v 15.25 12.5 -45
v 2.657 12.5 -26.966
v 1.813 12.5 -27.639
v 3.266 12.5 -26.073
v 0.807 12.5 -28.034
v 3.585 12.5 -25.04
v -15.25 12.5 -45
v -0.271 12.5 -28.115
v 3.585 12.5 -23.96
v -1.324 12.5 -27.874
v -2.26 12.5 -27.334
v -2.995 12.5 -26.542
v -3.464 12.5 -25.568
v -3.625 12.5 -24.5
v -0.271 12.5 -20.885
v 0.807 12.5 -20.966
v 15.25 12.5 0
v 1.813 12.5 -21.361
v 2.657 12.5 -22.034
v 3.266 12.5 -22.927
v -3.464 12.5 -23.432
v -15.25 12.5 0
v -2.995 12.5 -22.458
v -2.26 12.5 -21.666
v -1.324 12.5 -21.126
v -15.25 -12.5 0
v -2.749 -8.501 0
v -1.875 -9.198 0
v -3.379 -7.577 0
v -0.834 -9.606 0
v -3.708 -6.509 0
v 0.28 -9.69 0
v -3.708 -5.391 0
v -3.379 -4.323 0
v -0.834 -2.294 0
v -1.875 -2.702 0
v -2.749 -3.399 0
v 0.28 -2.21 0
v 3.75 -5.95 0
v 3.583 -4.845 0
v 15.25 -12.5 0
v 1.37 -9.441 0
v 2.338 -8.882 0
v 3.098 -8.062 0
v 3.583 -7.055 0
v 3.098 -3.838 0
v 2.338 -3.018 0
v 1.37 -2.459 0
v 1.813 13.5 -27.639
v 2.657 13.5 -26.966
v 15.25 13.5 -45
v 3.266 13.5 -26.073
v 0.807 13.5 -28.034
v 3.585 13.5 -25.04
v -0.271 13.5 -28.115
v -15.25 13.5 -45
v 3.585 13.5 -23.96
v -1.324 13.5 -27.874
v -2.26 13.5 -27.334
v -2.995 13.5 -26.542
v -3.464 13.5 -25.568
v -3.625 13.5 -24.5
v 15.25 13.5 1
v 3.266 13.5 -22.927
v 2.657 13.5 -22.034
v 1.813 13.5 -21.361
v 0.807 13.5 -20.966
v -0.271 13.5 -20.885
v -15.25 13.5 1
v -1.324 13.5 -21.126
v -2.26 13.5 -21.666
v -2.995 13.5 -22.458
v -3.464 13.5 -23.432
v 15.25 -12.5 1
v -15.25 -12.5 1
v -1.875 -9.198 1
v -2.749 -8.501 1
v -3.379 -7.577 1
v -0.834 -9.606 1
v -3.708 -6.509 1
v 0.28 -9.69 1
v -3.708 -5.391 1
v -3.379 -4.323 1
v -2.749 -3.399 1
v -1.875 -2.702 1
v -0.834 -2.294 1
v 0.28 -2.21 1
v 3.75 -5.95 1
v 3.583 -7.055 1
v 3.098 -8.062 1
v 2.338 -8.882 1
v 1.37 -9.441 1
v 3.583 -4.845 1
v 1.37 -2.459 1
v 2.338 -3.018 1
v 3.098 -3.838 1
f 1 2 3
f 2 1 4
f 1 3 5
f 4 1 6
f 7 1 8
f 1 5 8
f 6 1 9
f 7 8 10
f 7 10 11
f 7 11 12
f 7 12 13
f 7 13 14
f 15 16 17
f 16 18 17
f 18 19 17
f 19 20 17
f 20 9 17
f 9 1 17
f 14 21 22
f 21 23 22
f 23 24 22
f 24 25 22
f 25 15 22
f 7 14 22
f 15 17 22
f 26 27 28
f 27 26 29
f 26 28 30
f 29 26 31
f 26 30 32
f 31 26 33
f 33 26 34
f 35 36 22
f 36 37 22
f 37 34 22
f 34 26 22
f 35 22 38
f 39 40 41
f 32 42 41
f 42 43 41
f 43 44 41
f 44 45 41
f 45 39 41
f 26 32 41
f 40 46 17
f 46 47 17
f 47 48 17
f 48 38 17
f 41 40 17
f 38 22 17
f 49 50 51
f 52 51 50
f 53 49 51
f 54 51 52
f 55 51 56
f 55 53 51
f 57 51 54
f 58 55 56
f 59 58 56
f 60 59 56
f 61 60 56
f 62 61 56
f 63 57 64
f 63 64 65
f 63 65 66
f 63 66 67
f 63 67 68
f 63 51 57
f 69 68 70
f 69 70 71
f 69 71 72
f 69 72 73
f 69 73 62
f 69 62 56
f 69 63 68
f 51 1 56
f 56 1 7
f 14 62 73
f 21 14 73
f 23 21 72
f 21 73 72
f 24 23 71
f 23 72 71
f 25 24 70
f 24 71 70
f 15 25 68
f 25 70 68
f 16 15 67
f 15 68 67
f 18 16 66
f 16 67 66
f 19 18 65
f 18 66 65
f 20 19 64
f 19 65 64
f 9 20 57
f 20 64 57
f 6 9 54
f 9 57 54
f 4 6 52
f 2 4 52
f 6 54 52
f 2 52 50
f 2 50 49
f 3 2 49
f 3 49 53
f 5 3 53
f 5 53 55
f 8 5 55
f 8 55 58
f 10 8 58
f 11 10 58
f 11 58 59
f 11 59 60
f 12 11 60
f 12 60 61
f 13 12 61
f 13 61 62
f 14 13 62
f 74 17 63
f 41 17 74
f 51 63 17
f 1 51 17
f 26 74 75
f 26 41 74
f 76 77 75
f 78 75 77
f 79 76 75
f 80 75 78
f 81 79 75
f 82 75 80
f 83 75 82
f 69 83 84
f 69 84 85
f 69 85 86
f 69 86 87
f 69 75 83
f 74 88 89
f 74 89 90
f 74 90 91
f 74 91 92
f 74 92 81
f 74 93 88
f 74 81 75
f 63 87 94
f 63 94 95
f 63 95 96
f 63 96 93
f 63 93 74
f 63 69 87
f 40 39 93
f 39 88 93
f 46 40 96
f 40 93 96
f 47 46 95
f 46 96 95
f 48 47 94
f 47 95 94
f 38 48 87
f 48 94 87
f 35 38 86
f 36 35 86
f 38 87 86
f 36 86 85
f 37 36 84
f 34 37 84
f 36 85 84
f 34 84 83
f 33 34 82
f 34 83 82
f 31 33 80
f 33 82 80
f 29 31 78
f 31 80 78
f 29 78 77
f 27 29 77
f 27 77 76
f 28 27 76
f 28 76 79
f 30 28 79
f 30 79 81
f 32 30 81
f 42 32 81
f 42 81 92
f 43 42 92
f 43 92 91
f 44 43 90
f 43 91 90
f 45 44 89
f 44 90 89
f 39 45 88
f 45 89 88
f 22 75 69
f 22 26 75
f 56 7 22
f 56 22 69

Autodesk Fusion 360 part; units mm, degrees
sketch "Sketch1" plane through (0, 0, 0) normal (0, 0, 1) x (1, 0, 0)
  line L0 (15.25, -12.5) -> (-15.25, -12.5)
  line L1 (-15.25, -12.5) -> (-15.25, 12.5)
  line L2 (-15.25, 12.5) -> (15.25, 12.5)
  line L3 (15.25, 12.5) -> (15.25, -12.5)
  line L4 (15.25, -12.5) -> (-15.25, 12.5) construction
  line L5 (-15.25, -12.5) -> (15.25, 12.5) construction
  dimension "d1" = 30.5
  dimension "d2" = 25
extrude "Extrude1" add sketch "Sketch1" along normal blind 1
sketch "Sketch2" plane through (0, 12.5, 0) normal (0, 1, 0) x (-1, 0, 0)
  line L0 (-15.25, 0) -> (15.25, 0)
  line L1 (15.25, 0) -> (15.25, 1)
  line L2 (15.25, 1) -> (-15.25, 1)
  line L3 (-15.25, 1) -> (-15.25, 0)
  line L4 (15.25, 1) -> (-15.25, 1)
  line L5 (-15.25, 1) -> (-15.25, -45)
  line L6 (-15.25, -45) -> (15.25, -45)
  line L7 (15.25, -45) -> (15.25, 1)
  dimension "d5" = 46
  dimension "d6" = 30.5
extrude "Extrude2" add sketch "Sketch2" along normal blind 1
sketch "Sketch3" plane through (0, 0, 1) normal (0, 0, 1) x (1, 0, 0)
  line L0 (-15.25, 13.5) -> (-15.25, -12.5)
  line L1 (-15.25, -12.5) -> (15.25, -12.5)
  line L2 (15.25, -12.5) -> (15.25, 13.5)
  line L3 (15.25, 13.5) -> (-15.25, 13.5)
  line L4 (0, -12.5) -> (0, -5.95)
  circle A0 centre (0, -5.95) radius 3.75
  dimension "d9" = 6.55
  dimension "d10" = 7.5
extrude "Extrude3" cut sketch "Sketch3" against normal blind 46 contours A0
sketch "Sketch4" plane through (0, 13.5, 0) normal (0, 1, 0) x (-1, 0, 0)
  line L0 (15.25, -45) -> (15.25, 1)
  line L1 (15.25, 1) -> (-15.25, 1)
  line L2 (-15.25, 1) -> (-15.25, -45)
  line L3 (-15.25, -45) -> (15.25, -45)
  line L4 (0, 1) -> (0, -24.5)
  circle A0 centre (0, -24.5) radius 3.625
  dimension "d13" = 25.5
  dimension "d14" = 7.25
extrude "Extrude4" cut sketch "Sketch4" against normal blind 20 contours A0
equation "d9 = 2.8 mm + 3.75 mm"
